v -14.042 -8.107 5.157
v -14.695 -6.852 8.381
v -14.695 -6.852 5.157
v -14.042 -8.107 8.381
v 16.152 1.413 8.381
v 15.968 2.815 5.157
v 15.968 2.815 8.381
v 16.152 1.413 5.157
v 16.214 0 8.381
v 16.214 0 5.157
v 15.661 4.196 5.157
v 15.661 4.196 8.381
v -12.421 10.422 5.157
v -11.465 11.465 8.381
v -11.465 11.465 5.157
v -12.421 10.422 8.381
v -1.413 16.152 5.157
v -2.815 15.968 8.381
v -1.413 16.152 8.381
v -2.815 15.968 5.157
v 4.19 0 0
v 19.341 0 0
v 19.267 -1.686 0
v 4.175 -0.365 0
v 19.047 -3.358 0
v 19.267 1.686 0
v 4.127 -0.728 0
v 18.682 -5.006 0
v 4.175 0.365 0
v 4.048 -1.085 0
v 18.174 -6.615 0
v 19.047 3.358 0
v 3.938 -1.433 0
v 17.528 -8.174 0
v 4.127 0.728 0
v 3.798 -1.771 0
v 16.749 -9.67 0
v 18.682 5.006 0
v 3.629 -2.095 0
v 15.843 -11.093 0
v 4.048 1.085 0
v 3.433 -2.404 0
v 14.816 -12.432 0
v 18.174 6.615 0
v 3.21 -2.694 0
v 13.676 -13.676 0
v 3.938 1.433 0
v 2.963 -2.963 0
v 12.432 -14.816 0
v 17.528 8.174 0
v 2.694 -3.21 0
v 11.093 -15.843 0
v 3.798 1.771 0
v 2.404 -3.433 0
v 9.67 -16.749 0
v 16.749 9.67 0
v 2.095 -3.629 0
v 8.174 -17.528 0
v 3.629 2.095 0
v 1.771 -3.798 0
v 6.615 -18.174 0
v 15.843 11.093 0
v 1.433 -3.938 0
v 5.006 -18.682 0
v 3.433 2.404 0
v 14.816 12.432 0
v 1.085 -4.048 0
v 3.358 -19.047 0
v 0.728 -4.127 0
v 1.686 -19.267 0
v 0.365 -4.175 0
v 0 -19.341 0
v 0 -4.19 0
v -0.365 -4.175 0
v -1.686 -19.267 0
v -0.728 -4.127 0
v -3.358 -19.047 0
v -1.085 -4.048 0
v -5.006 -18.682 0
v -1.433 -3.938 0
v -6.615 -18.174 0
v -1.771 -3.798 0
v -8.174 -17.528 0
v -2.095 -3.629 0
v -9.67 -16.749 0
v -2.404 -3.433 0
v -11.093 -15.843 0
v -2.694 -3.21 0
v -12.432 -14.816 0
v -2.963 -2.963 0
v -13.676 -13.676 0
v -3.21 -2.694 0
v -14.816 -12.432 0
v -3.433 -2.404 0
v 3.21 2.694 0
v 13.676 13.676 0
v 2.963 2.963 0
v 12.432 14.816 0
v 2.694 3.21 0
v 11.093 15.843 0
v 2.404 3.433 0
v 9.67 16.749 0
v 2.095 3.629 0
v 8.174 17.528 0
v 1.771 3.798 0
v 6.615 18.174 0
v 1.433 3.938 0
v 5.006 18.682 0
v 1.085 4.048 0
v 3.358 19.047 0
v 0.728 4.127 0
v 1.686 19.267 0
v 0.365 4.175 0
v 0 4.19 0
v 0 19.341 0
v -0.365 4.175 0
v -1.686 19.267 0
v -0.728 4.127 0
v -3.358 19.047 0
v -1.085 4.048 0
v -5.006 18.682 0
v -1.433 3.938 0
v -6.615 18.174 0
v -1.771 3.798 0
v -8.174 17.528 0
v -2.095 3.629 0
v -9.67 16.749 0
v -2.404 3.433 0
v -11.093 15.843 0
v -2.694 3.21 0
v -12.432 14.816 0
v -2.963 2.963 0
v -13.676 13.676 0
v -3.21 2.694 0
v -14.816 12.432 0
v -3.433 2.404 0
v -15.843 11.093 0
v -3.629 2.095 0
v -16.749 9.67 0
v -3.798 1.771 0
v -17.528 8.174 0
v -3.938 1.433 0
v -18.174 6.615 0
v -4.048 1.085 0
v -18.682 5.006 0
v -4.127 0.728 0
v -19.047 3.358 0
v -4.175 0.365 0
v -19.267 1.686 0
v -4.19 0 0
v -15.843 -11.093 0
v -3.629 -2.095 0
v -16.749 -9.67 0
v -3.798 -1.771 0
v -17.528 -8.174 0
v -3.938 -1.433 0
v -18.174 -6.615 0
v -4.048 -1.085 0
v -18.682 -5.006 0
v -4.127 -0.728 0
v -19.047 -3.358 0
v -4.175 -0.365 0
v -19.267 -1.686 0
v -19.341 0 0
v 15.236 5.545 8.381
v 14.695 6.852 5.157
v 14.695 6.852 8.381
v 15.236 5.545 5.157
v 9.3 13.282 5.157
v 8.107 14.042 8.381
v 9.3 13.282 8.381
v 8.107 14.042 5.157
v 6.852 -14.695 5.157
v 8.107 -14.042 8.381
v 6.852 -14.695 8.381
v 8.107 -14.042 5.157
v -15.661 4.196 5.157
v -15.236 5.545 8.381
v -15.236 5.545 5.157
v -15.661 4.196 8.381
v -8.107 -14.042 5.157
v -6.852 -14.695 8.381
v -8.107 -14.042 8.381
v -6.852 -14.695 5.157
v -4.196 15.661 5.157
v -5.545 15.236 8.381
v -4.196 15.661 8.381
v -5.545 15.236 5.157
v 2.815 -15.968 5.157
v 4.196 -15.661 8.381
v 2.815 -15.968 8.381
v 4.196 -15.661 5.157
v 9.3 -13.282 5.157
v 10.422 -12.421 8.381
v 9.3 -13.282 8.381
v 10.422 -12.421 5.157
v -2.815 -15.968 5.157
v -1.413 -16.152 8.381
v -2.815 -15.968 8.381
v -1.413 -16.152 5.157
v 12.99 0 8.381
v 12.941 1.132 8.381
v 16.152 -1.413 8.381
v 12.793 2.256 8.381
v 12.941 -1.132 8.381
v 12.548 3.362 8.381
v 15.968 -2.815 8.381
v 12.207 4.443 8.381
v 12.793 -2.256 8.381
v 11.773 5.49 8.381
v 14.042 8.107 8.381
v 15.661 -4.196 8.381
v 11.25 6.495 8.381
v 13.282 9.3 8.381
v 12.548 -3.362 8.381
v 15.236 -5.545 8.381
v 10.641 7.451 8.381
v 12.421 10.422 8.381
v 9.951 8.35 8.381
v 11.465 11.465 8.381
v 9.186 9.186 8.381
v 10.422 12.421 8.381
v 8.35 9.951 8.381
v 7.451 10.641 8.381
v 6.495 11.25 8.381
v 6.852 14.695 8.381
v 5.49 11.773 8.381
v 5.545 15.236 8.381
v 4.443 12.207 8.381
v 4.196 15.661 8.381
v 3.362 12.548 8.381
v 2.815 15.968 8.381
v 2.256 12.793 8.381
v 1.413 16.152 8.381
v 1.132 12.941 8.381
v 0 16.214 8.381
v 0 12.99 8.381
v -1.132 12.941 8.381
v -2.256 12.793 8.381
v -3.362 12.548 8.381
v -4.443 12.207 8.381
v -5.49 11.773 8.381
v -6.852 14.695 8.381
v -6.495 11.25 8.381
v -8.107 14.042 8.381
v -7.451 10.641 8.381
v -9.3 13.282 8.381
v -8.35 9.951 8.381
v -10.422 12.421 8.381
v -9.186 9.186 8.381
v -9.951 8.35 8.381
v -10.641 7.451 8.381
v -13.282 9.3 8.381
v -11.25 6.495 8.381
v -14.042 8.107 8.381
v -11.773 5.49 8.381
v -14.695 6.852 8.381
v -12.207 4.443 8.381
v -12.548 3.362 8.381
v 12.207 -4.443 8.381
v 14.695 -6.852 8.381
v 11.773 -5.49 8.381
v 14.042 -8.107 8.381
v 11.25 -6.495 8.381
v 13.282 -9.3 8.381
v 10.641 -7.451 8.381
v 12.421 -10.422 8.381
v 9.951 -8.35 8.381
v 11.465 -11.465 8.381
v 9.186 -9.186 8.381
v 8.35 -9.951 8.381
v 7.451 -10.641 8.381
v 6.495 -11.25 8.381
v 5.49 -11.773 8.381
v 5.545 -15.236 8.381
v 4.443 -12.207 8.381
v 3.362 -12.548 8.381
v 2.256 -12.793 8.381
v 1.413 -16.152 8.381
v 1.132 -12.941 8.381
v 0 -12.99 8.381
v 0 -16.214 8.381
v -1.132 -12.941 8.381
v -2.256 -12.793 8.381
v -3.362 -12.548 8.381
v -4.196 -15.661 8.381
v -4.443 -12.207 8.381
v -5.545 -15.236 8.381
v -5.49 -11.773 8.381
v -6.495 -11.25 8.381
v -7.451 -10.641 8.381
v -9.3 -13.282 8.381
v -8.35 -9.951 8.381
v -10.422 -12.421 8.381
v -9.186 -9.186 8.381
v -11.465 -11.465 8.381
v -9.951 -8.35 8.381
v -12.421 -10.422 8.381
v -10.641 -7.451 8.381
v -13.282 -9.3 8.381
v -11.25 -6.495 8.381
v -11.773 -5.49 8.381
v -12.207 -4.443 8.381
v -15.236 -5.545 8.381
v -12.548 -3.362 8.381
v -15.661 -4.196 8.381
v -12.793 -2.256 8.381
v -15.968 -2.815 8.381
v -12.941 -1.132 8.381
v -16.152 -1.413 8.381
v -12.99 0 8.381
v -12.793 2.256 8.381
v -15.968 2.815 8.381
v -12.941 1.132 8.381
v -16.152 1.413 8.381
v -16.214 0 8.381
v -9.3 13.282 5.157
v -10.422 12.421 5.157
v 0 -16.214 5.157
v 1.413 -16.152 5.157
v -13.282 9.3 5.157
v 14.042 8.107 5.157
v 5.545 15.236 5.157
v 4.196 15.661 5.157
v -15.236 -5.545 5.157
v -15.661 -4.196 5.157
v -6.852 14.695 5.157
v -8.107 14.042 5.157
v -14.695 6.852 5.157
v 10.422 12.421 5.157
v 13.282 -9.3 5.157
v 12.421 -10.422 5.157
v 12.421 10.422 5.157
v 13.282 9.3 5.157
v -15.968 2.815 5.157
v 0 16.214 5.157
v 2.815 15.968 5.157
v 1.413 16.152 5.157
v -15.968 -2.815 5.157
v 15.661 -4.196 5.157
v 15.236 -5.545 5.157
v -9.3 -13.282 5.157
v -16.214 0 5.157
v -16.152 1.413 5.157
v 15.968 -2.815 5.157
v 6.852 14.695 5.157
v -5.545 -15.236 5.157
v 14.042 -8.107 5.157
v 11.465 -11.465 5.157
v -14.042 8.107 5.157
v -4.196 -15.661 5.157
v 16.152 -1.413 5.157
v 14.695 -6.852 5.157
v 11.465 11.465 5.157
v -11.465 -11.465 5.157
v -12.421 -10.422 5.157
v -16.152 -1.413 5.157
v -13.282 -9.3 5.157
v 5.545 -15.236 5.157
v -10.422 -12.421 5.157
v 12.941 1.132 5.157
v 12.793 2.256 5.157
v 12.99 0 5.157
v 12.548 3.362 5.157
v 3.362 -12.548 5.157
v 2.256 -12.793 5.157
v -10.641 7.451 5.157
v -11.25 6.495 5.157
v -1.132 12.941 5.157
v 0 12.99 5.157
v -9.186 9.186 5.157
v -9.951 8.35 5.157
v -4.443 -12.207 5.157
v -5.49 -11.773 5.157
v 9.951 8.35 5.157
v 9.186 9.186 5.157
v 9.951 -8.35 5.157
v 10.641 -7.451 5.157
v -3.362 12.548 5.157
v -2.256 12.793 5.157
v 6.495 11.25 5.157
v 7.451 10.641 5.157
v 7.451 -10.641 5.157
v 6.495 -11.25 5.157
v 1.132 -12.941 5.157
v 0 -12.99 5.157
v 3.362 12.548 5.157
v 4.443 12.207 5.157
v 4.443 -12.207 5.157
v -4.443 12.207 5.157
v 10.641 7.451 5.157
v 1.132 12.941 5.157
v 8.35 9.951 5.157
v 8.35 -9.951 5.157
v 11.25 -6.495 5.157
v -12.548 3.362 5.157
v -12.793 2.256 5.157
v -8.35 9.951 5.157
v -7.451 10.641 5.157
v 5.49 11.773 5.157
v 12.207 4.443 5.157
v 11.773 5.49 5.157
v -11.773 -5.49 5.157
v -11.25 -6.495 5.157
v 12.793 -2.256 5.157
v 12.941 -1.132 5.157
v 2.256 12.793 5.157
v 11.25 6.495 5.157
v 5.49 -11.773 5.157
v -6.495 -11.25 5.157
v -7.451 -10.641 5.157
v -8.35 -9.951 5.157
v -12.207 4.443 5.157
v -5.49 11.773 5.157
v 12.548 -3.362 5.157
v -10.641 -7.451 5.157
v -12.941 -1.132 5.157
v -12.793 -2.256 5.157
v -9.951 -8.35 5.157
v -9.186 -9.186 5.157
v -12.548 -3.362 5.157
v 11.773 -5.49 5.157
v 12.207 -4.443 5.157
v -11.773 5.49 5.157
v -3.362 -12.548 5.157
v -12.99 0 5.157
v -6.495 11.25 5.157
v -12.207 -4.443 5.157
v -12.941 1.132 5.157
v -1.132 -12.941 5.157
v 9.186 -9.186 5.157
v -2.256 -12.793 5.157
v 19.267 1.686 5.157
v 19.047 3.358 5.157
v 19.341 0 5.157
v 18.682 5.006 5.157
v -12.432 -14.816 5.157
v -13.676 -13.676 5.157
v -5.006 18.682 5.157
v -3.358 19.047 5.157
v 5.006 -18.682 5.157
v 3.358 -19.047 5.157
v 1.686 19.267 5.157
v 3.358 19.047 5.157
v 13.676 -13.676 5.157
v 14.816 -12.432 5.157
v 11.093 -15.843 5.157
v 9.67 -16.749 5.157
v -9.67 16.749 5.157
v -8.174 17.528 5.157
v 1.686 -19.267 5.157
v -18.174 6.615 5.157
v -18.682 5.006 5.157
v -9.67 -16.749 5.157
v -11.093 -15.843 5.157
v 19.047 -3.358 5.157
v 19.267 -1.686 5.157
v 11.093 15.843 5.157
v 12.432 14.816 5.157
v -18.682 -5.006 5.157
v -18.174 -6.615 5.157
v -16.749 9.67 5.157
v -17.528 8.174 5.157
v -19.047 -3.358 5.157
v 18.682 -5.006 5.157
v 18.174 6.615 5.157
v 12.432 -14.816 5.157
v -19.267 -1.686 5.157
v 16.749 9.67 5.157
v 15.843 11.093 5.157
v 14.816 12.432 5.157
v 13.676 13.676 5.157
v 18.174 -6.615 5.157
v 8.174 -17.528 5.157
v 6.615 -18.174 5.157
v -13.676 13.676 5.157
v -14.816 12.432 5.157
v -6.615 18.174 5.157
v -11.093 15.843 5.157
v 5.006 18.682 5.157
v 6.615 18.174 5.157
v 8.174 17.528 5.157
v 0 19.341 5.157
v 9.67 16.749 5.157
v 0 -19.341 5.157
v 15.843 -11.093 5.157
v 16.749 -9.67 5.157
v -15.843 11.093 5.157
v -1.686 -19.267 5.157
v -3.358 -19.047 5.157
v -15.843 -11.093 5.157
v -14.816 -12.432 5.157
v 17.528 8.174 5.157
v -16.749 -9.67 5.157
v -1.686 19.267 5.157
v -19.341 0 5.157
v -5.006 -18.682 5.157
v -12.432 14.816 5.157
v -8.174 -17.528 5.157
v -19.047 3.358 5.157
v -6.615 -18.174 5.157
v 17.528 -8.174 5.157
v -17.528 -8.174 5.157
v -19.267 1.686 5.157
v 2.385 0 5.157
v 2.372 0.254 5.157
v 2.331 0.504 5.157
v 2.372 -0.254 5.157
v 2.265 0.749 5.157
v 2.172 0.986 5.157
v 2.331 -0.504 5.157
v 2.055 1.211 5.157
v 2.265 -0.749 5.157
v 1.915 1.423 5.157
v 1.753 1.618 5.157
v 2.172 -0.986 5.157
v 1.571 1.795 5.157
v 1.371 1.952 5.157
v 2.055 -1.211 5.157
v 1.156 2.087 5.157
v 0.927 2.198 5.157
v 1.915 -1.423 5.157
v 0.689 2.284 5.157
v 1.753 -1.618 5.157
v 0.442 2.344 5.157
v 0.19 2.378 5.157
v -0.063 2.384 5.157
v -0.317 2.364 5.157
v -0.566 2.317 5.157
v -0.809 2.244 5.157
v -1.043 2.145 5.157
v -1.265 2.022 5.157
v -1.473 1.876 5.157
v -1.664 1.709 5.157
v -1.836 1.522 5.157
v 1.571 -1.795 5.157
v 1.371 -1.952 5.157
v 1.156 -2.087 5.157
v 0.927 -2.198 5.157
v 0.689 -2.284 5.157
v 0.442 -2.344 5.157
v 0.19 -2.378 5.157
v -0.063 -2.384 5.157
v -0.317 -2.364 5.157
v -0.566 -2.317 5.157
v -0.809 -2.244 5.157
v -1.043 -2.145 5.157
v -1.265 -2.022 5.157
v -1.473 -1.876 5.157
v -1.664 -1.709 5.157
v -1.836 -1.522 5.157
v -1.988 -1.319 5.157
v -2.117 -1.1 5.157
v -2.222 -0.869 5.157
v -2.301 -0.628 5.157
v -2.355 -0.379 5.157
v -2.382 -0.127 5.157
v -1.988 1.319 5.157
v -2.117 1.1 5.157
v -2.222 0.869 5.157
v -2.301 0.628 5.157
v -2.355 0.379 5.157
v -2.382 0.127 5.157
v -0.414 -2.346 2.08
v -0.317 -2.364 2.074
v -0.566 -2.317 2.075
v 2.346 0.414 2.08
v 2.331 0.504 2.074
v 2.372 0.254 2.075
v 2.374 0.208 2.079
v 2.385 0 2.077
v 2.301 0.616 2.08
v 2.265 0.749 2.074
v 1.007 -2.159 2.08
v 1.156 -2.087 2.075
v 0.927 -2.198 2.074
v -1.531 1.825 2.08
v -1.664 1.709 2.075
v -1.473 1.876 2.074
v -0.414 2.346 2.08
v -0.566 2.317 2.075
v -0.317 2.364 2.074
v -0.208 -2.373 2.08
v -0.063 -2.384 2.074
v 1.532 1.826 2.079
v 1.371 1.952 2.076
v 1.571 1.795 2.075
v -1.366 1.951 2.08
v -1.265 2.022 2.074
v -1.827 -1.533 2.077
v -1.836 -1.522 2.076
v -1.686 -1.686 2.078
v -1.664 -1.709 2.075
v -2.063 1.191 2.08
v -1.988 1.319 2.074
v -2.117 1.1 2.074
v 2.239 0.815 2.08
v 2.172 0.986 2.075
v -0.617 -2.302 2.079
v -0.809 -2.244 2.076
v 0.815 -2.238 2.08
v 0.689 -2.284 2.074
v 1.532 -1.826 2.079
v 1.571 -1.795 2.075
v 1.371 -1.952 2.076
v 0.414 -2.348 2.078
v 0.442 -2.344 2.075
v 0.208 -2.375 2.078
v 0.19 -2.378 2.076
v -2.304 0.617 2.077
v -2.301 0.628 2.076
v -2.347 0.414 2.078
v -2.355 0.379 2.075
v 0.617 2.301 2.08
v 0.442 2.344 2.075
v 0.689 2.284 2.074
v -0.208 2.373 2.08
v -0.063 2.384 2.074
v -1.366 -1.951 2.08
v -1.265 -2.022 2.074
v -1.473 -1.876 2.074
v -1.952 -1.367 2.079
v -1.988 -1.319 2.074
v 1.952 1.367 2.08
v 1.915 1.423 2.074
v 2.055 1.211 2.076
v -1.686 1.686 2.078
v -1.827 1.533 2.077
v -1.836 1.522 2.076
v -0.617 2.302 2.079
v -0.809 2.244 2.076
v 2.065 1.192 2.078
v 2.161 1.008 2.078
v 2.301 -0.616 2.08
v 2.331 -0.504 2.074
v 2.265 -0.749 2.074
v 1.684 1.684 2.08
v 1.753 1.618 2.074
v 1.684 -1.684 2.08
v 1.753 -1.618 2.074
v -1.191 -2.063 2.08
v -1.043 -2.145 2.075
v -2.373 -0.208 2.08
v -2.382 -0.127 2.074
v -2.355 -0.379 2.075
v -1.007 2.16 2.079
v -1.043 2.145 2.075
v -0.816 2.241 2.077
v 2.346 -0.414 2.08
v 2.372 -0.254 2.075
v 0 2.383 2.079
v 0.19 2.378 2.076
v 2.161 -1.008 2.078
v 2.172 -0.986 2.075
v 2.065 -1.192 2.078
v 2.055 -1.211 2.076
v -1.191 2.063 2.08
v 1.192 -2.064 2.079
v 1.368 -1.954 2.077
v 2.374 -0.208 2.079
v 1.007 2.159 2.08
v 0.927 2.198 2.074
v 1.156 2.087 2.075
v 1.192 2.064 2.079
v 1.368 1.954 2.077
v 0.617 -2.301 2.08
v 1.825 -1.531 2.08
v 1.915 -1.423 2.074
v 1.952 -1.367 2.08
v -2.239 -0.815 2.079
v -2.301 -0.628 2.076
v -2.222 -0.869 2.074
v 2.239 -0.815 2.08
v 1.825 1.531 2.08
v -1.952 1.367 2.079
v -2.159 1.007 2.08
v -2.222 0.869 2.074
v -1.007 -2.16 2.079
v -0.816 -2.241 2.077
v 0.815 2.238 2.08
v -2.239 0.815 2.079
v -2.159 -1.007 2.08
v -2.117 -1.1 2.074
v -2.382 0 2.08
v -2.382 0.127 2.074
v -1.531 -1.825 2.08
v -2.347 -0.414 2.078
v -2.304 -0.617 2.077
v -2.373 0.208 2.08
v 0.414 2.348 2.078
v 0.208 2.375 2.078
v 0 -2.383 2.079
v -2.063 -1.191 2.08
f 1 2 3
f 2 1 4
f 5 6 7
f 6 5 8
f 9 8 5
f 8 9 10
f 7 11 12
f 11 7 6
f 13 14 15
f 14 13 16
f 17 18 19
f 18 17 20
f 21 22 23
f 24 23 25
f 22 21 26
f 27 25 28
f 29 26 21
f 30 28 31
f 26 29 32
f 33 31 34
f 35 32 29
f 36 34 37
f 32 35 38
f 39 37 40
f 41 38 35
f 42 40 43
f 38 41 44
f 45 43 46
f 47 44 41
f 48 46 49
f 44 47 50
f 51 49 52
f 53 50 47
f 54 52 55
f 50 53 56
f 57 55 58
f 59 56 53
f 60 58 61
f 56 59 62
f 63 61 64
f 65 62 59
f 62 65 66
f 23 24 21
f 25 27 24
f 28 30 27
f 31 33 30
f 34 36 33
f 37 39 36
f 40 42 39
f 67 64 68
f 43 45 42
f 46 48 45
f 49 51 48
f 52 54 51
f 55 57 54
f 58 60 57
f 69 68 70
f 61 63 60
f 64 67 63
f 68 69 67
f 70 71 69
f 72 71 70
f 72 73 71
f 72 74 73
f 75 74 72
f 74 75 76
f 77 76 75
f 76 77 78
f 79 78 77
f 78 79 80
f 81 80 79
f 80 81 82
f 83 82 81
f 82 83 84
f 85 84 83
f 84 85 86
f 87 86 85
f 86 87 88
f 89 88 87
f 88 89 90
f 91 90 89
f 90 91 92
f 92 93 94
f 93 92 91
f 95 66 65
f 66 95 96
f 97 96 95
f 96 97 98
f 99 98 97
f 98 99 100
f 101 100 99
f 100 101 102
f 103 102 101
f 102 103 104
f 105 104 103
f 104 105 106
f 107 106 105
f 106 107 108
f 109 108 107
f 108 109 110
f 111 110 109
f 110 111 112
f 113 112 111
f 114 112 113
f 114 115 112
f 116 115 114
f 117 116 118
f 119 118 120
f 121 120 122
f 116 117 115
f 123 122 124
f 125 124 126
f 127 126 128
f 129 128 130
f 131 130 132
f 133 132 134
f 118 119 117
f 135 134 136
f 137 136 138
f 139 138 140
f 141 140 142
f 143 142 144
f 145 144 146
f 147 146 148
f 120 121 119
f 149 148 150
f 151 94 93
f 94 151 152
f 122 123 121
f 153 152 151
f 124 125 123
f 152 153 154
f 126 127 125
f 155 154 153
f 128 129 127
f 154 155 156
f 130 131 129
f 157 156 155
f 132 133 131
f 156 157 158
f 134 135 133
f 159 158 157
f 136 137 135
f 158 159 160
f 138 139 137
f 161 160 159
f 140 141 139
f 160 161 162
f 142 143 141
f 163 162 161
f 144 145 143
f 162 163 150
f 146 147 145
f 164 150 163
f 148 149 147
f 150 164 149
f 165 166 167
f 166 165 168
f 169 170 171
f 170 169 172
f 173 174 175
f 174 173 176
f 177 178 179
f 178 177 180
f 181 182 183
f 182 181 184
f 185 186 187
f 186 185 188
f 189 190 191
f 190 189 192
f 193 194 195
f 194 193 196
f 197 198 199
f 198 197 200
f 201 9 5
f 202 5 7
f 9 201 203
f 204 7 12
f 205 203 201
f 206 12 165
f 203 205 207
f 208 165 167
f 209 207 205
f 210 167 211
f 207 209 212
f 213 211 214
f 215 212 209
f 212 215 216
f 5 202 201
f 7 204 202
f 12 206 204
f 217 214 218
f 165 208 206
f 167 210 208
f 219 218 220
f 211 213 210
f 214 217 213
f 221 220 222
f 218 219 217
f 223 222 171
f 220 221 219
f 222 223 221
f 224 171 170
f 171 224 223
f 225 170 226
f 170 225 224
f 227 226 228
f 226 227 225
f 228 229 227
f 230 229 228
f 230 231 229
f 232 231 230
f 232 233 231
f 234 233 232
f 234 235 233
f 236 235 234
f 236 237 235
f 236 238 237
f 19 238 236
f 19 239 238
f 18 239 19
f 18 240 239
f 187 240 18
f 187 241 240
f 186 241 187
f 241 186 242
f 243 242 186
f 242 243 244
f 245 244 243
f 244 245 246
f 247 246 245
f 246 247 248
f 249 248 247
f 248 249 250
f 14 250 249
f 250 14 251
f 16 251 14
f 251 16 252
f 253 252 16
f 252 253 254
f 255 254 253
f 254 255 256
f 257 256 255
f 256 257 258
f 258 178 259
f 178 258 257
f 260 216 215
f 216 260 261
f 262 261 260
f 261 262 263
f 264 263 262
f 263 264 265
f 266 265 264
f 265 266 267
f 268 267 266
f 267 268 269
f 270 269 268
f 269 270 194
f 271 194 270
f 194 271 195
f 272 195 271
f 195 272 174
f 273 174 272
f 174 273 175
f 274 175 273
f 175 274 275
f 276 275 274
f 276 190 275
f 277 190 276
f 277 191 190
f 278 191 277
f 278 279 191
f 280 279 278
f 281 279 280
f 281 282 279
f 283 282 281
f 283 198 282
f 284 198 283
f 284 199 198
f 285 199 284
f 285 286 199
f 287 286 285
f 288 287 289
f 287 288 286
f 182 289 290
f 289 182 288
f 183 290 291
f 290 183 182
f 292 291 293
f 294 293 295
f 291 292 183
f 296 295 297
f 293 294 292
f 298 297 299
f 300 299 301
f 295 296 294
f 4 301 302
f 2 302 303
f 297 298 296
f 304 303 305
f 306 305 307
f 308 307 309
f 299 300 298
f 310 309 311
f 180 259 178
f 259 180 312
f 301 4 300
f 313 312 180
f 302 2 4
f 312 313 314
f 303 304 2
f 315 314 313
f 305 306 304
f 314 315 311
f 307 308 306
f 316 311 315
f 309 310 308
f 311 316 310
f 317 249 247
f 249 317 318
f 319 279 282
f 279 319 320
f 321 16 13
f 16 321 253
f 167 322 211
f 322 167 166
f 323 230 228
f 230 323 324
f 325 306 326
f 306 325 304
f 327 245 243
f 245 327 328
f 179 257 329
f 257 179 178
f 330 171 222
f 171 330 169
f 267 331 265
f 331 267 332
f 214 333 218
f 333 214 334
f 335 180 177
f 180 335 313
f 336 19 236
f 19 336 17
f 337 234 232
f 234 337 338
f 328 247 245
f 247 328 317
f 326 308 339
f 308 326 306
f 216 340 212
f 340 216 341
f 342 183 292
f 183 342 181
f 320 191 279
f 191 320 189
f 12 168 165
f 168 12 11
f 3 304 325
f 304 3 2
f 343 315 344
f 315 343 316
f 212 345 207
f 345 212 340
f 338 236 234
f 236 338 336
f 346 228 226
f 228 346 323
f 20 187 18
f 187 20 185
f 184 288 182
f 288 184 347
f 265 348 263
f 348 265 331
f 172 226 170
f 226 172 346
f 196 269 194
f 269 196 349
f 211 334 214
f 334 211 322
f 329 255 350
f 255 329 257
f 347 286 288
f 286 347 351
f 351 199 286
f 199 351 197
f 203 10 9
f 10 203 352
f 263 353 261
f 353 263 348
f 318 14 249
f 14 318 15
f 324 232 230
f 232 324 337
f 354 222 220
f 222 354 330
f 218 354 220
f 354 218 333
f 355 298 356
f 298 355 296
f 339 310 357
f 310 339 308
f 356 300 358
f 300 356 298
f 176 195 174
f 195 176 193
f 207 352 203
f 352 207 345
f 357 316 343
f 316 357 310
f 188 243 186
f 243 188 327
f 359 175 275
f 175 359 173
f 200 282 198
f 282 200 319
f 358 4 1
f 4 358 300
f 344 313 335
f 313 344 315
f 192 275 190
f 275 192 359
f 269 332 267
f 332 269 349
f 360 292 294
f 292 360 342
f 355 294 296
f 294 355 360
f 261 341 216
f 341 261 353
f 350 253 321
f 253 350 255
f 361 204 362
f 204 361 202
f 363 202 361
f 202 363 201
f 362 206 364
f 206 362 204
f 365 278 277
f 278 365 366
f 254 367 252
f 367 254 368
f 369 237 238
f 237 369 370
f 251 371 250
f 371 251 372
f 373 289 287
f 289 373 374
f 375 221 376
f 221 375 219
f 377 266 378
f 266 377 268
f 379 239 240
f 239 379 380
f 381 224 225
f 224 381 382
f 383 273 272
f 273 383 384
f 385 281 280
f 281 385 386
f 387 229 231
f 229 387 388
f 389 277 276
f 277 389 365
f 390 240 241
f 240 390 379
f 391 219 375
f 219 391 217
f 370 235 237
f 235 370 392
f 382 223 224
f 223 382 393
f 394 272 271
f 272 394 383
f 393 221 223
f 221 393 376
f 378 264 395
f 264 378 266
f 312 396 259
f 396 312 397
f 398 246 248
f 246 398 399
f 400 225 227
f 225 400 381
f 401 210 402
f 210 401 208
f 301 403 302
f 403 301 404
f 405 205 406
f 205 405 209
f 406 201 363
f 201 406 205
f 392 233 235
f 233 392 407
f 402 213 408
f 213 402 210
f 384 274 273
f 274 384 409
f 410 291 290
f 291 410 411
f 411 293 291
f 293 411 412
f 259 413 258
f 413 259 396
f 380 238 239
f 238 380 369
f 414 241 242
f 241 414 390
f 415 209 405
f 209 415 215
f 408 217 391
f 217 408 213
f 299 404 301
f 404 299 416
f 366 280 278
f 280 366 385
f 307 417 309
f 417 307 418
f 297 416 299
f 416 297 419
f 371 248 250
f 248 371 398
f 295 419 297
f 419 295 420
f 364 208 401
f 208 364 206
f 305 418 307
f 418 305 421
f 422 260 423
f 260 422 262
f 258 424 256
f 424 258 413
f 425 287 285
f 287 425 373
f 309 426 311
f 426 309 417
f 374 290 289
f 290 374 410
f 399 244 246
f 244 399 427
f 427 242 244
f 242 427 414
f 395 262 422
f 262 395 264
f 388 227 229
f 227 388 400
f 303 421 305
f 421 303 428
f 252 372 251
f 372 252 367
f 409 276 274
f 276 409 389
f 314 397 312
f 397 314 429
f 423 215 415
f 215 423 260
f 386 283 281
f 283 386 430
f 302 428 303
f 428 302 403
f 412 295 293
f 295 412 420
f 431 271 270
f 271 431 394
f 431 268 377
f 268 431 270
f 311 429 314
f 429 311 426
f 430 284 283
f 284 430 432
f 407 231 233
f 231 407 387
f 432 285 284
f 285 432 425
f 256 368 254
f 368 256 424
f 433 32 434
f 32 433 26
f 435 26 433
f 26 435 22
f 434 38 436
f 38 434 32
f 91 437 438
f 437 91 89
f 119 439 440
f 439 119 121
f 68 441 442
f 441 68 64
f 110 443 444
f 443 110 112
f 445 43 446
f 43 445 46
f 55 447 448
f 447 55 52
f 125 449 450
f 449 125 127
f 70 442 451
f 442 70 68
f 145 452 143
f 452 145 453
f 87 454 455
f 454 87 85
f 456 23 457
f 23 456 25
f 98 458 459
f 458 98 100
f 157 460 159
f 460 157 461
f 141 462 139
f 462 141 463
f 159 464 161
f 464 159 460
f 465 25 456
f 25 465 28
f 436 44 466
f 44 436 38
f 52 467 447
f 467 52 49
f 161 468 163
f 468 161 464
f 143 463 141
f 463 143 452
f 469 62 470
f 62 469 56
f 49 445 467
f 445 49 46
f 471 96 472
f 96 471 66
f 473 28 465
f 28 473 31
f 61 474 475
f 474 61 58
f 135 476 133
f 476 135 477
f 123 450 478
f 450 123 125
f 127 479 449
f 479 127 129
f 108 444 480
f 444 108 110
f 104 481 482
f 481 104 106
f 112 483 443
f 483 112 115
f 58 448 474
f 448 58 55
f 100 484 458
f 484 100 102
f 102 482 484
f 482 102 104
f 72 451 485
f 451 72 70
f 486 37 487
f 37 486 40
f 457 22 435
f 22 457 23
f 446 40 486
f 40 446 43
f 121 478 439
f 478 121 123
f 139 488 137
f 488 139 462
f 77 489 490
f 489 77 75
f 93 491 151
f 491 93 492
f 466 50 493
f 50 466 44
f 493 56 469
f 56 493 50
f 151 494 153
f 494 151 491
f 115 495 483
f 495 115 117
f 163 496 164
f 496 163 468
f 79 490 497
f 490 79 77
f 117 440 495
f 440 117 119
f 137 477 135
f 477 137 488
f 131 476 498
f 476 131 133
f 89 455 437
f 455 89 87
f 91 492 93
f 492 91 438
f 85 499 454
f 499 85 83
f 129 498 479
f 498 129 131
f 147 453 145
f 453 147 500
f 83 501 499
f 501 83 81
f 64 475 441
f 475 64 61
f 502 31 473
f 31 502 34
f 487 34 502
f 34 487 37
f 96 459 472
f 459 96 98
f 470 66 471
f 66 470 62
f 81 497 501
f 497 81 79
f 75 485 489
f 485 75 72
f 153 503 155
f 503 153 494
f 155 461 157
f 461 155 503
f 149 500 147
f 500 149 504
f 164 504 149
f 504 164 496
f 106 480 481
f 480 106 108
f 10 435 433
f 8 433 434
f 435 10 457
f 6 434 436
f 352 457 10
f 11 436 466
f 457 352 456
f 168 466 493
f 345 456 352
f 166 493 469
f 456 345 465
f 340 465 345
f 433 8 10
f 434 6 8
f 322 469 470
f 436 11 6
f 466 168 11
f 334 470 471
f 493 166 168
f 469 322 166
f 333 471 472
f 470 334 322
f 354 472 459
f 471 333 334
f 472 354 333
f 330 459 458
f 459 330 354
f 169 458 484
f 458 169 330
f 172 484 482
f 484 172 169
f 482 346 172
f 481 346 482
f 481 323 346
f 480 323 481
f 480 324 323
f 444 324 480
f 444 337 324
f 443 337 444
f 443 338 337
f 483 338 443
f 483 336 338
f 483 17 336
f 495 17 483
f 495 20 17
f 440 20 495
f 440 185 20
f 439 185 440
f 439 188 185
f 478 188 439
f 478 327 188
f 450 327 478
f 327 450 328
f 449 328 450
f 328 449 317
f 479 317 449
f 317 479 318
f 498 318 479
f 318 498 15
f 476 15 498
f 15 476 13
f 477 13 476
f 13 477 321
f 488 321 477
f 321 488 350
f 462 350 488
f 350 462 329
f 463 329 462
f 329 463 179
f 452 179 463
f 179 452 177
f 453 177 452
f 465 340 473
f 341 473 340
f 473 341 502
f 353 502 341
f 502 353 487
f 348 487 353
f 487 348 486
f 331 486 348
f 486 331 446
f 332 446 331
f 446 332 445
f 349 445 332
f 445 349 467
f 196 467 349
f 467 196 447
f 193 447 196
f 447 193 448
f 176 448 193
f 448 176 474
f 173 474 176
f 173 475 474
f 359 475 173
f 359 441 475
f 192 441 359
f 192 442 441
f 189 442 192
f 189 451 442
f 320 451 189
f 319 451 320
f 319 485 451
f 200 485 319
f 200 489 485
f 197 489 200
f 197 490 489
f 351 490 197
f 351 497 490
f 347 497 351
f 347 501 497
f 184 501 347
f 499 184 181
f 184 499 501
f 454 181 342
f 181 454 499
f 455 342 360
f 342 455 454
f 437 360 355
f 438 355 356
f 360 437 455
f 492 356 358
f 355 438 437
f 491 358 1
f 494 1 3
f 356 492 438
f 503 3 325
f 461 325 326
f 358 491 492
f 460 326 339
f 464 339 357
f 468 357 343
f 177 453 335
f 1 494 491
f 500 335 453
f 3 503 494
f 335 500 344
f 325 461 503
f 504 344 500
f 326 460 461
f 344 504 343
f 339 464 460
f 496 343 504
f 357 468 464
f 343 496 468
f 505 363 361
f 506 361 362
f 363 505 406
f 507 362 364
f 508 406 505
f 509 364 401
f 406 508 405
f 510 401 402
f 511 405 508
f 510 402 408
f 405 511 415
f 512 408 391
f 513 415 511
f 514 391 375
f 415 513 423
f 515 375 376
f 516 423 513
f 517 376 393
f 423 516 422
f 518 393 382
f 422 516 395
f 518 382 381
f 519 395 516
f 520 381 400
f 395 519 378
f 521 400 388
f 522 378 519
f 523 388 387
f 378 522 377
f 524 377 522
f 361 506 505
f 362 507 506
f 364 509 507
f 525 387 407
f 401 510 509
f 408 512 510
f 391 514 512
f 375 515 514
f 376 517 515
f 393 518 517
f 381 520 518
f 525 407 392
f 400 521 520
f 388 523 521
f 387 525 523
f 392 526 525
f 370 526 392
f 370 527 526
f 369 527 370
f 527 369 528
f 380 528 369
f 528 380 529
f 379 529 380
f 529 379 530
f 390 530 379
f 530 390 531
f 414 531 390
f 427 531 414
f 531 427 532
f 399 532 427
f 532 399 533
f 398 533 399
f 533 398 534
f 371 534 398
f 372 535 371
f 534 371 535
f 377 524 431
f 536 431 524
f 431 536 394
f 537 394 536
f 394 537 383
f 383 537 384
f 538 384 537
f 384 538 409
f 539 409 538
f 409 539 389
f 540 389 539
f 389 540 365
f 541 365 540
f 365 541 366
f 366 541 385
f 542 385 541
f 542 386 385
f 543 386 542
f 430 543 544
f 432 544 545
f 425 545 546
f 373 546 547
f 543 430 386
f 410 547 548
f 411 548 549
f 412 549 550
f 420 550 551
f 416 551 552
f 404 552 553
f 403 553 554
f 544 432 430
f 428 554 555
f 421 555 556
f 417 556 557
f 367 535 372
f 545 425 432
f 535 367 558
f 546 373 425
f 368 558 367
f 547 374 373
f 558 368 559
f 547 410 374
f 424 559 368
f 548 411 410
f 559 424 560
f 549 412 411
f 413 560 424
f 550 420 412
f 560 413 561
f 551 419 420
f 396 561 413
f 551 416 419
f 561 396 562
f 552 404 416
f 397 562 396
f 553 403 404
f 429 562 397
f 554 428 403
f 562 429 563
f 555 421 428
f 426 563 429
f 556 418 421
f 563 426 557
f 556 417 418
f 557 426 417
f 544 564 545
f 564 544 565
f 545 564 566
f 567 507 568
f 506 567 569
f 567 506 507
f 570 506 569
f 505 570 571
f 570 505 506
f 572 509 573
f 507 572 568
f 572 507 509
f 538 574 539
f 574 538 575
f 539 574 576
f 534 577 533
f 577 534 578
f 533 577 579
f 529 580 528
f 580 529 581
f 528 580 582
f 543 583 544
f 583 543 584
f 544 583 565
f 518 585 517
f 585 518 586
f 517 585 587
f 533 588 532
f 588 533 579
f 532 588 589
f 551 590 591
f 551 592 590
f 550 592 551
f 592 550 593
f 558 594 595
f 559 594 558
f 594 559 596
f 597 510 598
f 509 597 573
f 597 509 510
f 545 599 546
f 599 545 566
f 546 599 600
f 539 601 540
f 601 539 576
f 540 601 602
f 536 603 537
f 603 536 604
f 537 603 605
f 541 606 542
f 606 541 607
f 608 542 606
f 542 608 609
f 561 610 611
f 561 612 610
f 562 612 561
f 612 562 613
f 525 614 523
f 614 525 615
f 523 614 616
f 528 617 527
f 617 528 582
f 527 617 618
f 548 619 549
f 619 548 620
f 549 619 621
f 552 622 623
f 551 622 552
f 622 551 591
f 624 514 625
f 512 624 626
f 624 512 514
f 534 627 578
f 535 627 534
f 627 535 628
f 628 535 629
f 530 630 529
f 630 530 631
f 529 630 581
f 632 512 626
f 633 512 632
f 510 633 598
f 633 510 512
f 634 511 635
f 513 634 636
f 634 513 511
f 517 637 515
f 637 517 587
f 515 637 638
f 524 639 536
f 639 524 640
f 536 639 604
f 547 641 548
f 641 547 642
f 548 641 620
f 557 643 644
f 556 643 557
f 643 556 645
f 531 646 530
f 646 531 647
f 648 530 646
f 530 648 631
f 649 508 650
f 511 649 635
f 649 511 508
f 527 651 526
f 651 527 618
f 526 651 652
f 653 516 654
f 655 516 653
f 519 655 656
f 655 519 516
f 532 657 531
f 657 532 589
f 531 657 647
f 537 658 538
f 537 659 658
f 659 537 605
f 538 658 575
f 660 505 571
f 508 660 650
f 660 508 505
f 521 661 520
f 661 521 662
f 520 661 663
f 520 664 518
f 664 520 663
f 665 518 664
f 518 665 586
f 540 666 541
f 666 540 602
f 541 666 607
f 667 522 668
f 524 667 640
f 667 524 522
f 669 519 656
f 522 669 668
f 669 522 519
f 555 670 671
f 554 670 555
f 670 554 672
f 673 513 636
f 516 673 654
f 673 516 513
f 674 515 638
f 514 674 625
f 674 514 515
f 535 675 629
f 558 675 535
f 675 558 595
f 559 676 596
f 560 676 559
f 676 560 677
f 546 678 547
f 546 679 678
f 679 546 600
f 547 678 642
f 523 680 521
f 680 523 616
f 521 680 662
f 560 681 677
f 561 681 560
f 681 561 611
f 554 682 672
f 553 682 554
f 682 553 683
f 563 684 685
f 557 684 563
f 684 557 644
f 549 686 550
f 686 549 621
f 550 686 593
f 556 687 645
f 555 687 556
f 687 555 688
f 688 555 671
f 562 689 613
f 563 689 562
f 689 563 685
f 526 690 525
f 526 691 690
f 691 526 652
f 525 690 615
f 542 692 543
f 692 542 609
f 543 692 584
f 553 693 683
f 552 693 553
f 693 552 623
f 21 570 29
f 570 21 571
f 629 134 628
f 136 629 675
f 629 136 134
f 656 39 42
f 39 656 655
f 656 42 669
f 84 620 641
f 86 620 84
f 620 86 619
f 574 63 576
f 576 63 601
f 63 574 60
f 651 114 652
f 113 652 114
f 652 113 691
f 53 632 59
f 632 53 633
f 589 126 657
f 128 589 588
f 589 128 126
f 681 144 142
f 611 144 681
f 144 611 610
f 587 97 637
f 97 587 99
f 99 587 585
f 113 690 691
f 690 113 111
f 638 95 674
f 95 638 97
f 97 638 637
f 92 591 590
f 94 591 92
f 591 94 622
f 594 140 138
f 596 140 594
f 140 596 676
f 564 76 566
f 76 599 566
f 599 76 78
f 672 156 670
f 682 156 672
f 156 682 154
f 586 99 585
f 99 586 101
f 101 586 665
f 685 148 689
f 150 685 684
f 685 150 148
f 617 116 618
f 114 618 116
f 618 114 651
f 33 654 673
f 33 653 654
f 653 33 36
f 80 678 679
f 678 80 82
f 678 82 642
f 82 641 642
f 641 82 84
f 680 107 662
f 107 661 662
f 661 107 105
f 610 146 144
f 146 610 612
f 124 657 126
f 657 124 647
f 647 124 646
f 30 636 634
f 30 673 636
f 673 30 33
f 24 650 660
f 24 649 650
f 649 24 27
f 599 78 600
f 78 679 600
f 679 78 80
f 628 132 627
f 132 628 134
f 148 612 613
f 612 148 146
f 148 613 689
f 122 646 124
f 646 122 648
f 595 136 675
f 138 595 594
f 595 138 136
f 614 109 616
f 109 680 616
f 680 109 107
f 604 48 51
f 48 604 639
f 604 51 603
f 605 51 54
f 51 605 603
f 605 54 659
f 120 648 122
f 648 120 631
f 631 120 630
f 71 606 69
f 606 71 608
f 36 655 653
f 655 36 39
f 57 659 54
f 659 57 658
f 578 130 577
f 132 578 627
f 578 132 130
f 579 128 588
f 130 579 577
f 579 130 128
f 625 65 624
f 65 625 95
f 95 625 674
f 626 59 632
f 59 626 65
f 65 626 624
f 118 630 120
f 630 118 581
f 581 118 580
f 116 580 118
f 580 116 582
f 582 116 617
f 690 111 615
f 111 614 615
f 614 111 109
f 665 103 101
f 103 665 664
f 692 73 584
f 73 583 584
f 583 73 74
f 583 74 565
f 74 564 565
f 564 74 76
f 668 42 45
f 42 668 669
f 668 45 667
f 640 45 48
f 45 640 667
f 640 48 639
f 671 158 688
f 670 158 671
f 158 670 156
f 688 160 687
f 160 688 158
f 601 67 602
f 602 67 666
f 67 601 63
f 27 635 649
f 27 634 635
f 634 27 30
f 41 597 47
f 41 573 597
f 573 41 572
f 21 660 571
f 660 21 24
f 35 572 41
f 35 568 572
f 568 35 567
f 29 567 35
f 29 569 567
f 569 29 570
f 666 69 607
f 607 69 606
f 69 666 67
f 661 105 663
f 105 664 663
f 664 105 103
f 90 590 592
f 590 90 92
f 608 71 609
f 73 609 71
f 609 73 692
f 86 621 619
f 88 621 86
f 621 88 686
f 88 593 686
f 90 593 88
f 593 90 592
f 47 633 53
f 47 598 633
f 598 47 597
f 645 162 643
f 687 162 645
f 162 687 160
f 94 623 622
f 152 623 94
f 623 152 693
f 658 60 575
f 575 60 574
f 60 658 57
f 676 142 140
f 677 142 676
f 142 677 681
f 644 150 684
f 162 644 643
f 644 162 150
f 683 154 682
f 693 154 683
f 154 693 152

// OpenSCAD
// Rod_Bottom_Cap
//
// This is part of my project to set up a 5 gallon bucket to store all of my 3d printer filament.
// The plan is to stack the filament along a 1" wooden dowel
// A cap on the bottom will hold the filament so you can pick it all up at once and it will keep the dowel vertical when empty.
// Probably will want a handle on the top for ergonomics when lifting the filament out
// May need some features for holding dessicant.
    // Bulk or packets?
//
// Made by Adam Britt
//
// Revision 0   12/30/2018
    // Original
//
///////////////////////////////////////////////////////////////
//
// Global resolution
$fs = 0.010;    // Don't generate smaller facets than 0.010 in, which is the lower bound that SCAD will accept
$fa = 5;        // Don't generate larger angles than 5 degrees
//
// Material Property Declarations
PLA_CTE = 0.000085 * 5/9; // Coefficient of thermal expansion converted from 1/Celsius to 1/Fahrenheit
    // 7.4x10^-4 C^-1 https://www.researchgate.net/post/What_is_the_coefficient_of_the_linear_thermal_expansion_of_PLA_polylactic_acid_polymer
    // 8.5x10^-5 C^-1 https://omnexus.specialchem.com/polymer-properties/properties/coefficient-of-linear-thermal-expansion
//
// Geometry Declarations
bf_d = 1.5;   // Bottom Flange Diameter [inches]
bf_t = 0.200;   // Bottom Flange Thickness [inches]
f_r = 0.250;    // Fillet Radius [inches]
h_d = 0.185;    // Screw Hole Diameter [inches]
cs_d = 0.325;   // Countersink diameter [inches]
cs_a = 82;      // Coutersink angle [degrees]
c_id = (0.985+1.030)/2;     // Collar Inner Diameter [inches]
                                // Measured at 0.985-1.030"
c_wt = 0.125;               // Collar Wall Thickness [inches]
c_od = c_id+c_wt*2;         // Collar Outer Diameter [inches]
c_h = bf_t+0.125;                // Collar Height [inches]
//
// Calculate anti-shrinkage correction for scaling
    // Collar ID is selected for driving dimension for correction factor as it it the most important fit
CTE_DIM = c_id;
K_CTE = (c_id + (c_id * PLA_CTE * (392-69))) / c_id;
//
// Call main module and build it all, scaled from in to mm, and scale up to account for thermal shrinkage.
scale([K_CTE,K_CTE,K_CTE]) scale(v=[25.4,25.4,25.4]) main();
//
// Module Definitions
//
// Main module to combine other modules
    // Add the flange, collar, and the fillet
    // Subtract the countersink and the screw hole
module main(){
    difference(){
        union(){
            // additive modules
            flange();
            collar();
            //fillet();
        }
        union(){
            // subtractive modules
            hole();
            countersink();
        }
    }
}
// Bottom Flange
    // Just make a cylinder
module flange(){
    cylinder(h=bf_t, r=bf_d/2, center=false);
}
// Collar
    // Create a cylinder for OD
    // Create a cylinder for ID
    // Subtract the ID from the OD
module collar(){
    difference(){
        cylinder(h=c_h, r=c_od/2, center=false);
        translate([0,0,-0.1*c_h]) cylinder(h=c_h*1.2, r=c_id/2, center=false);
    }
}
//Fillet
    // Create a square, revolve it
    // Create a circle, revolve it
    // Subtract the circular revolution from the square revolution
module fillet(){
    difference(){
        rotate_extrude(){
            translate([c_od/2,bf_t,0]){
                square(size = f_r, center = false);
            }
        }
        rotate_extrude(){
            translate([c_od/2+f_r,bf_t+f_r,0]){
                circle(r=f_r);
            }
        }
    }
}
// Screw Hole
    // Just a cylinder of sufficient size to pass the screw
module hole(){
    translate([0,0,-bf_t*0.1]) cylinder( h = bf_t*1.2, r = h_d/2, center = false);
}
// Countersink in Bottom Flange for Screw Head
module countersink(){
    cs_h = (cs_d/2)/(tan(cs_a/2));  // Calculate actual countersink height
    // Create cs_h2 and cs_d2 that add some stock to the cutting tool to avoid preview/manifold issues
    cs_h2 = cs_h * 1.1;
    cs_d2 = 2*cs_h2*tan(cs_a/2);
    // base = opposite
    // height = adjacent
    // tan(cs_a/2) = base/height
    // height = base/tan(cs_a/2)
        // base = radius = cs_d/2
    // height = (cs_d/2)/(tan(cs_a/2))
    //union(){
        translate([0,0,-0.1*cs_h])cone(cs_h2,cs_d2/2);
        //translate([0,0,-0.2*bf_t]) cylinder(h=bf_t*0.2, r=cs_d/2, center=false);
    //}
}
module cone(height, radius, center = false) {
    cylinder(height, radius, 0, center);
}
// Report key parameters
echo("The collar ID is c_id = ", c_id, " inches.");
echo("CTE correction factor is K_CTE = ",K_CTE, ".");
echo("CTE correction factor as measured is ", 1.0075/0.992, ".");
